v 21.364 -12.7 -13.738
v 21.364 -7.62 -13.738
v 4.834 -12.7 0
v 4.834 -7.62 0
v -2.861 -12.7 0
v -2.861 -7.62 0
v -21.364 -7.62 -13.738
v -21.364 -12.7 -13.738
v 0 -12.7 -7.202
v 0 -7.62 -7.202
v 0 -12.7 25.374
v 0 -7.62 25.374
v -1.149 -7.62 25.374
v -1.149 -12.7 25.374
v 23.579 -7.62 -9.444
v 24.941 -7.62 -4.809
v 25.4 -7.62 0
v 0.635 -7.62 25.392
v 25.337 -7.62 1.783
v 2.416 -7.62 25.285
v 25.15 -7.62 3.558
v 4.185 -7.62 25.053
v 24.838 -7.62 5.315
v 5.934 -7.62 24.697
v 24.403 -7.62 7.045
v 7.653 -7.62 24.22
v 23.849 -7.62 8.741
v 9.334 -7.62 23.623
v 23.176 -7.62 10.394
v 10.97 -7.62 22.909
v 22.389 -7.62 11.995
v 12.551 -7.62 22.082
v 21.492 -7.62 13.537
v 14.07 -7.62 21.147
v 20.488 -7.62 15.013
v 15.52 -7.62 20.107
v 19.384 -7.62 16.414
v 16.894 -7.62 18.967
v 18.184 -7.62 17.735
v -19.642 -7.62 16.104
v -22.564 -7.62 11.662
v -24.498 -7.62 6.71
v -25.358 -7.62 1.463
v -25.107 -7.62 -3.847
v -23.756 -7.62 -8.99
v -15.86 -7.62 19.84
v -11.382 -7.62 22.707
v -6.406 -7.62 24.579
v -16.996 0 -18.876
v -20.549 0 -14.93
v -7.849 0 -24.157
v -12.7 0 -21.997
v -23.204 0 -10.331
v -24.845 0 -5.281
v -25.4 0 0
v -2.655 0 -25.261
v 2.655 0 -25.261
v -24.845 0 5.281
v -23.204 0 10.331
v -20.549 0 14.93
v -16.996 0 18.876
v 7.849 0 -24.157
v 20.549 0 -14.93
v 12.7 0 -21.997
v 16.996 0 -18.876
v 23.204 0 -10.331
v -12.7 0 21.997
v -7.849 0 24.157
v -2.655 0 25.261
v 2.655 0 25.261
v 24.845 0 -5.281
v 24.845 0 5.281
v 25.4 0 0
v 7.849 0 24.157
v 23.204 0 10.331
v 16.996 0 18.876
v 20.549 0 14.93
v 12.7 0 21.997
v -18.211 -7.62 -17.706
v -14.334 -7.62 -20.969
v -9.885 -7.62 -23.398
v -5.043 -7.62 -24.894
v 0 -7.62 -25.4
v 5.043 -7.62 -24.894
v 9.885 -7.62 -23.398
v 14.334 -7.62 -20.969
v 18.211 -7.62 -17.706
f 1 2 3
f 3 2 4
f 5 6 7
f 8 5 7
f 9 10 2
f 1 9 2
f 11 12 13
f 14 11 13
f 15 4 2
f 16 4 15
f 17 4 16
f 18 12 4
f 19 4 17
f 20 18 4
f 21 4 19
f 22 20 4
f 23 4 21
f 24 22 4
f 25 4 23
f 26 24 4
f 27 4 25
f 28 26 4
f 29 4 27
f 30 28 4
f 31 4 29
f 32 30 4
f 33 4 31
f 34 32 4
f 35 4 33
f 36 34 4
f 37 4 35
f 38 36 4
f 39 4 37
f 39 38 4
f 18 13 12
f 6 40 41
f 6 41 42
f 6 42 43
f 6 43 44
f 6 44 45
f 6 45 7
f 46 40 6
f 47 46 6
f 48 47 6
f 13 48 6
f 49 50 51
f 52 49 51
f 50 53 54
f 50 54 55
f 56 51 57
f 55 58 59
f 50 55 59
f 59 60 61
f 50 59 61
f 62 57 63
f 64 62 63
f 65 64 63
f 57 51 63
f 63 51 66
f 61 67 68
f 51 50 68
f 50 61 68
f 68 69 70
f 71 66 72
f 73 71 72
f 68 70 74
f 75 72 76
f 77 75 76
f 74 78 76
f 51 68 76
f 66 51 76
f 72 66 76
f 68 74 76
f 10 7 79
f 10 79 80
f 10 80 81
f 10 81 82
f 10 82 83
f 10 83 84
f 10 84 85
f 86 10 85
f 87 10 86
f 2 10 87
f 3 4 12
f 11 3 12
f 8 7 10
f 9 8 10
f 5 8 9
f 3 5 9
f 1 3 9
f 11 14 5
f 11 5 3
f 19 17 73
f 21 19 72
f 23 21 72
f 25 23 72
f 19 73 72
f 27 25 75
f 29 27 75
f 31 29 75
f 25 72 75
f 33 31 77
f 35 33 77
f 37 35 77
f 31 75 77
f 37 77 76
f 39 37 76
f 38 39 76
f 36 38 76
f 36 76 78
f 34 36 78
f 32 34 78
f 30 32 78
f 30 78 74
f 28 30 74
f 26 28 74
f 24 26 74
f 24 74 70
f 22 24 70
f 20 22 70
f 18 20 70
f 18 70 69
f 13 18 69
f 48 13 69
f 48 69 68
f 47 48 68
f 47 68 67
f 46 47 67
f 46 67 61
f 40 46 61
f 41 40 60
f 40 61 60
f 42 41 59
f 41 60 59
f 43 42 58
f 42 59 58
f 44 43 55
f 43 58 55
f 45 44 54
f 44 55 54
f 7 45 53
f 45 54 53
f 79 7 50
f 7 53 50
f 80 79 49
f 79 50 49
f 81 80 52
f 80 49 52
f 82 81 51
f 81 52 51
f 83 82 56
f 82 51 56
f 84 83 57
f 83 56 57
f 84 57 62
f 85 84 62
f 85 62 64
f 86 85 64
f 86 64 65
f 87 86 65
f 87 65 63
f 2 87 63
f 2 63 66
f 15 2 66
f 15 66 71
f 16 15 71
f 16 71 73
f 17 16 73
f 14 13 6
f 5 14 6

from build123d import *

# Parameters (mm, degrees)
F1_DEPTH = 12.7
F2_R     = 25.4
F3_DEPTH = 7.62


with BuildPart() as f1:
    # F0 (on Front) → F1 (new body)
    with BuildSketch(Plane.XZ):
        Polygon((0, 25.373987), (-1.149251, 25.373987), (-2.861024, 0), (-21.364293, -13.737794), (0, -7.201886), (21.364293, -13.737794), (4.834144, 0), align=None)
    extrude(amount=F1_DEPTH)

    # F2 (on Front) → F3 (join)
    with BuildSketch(Plane.XZ):
        Circle(F2_R)
    extrude(amount=F3_DEPTH)


solid = f1.part
